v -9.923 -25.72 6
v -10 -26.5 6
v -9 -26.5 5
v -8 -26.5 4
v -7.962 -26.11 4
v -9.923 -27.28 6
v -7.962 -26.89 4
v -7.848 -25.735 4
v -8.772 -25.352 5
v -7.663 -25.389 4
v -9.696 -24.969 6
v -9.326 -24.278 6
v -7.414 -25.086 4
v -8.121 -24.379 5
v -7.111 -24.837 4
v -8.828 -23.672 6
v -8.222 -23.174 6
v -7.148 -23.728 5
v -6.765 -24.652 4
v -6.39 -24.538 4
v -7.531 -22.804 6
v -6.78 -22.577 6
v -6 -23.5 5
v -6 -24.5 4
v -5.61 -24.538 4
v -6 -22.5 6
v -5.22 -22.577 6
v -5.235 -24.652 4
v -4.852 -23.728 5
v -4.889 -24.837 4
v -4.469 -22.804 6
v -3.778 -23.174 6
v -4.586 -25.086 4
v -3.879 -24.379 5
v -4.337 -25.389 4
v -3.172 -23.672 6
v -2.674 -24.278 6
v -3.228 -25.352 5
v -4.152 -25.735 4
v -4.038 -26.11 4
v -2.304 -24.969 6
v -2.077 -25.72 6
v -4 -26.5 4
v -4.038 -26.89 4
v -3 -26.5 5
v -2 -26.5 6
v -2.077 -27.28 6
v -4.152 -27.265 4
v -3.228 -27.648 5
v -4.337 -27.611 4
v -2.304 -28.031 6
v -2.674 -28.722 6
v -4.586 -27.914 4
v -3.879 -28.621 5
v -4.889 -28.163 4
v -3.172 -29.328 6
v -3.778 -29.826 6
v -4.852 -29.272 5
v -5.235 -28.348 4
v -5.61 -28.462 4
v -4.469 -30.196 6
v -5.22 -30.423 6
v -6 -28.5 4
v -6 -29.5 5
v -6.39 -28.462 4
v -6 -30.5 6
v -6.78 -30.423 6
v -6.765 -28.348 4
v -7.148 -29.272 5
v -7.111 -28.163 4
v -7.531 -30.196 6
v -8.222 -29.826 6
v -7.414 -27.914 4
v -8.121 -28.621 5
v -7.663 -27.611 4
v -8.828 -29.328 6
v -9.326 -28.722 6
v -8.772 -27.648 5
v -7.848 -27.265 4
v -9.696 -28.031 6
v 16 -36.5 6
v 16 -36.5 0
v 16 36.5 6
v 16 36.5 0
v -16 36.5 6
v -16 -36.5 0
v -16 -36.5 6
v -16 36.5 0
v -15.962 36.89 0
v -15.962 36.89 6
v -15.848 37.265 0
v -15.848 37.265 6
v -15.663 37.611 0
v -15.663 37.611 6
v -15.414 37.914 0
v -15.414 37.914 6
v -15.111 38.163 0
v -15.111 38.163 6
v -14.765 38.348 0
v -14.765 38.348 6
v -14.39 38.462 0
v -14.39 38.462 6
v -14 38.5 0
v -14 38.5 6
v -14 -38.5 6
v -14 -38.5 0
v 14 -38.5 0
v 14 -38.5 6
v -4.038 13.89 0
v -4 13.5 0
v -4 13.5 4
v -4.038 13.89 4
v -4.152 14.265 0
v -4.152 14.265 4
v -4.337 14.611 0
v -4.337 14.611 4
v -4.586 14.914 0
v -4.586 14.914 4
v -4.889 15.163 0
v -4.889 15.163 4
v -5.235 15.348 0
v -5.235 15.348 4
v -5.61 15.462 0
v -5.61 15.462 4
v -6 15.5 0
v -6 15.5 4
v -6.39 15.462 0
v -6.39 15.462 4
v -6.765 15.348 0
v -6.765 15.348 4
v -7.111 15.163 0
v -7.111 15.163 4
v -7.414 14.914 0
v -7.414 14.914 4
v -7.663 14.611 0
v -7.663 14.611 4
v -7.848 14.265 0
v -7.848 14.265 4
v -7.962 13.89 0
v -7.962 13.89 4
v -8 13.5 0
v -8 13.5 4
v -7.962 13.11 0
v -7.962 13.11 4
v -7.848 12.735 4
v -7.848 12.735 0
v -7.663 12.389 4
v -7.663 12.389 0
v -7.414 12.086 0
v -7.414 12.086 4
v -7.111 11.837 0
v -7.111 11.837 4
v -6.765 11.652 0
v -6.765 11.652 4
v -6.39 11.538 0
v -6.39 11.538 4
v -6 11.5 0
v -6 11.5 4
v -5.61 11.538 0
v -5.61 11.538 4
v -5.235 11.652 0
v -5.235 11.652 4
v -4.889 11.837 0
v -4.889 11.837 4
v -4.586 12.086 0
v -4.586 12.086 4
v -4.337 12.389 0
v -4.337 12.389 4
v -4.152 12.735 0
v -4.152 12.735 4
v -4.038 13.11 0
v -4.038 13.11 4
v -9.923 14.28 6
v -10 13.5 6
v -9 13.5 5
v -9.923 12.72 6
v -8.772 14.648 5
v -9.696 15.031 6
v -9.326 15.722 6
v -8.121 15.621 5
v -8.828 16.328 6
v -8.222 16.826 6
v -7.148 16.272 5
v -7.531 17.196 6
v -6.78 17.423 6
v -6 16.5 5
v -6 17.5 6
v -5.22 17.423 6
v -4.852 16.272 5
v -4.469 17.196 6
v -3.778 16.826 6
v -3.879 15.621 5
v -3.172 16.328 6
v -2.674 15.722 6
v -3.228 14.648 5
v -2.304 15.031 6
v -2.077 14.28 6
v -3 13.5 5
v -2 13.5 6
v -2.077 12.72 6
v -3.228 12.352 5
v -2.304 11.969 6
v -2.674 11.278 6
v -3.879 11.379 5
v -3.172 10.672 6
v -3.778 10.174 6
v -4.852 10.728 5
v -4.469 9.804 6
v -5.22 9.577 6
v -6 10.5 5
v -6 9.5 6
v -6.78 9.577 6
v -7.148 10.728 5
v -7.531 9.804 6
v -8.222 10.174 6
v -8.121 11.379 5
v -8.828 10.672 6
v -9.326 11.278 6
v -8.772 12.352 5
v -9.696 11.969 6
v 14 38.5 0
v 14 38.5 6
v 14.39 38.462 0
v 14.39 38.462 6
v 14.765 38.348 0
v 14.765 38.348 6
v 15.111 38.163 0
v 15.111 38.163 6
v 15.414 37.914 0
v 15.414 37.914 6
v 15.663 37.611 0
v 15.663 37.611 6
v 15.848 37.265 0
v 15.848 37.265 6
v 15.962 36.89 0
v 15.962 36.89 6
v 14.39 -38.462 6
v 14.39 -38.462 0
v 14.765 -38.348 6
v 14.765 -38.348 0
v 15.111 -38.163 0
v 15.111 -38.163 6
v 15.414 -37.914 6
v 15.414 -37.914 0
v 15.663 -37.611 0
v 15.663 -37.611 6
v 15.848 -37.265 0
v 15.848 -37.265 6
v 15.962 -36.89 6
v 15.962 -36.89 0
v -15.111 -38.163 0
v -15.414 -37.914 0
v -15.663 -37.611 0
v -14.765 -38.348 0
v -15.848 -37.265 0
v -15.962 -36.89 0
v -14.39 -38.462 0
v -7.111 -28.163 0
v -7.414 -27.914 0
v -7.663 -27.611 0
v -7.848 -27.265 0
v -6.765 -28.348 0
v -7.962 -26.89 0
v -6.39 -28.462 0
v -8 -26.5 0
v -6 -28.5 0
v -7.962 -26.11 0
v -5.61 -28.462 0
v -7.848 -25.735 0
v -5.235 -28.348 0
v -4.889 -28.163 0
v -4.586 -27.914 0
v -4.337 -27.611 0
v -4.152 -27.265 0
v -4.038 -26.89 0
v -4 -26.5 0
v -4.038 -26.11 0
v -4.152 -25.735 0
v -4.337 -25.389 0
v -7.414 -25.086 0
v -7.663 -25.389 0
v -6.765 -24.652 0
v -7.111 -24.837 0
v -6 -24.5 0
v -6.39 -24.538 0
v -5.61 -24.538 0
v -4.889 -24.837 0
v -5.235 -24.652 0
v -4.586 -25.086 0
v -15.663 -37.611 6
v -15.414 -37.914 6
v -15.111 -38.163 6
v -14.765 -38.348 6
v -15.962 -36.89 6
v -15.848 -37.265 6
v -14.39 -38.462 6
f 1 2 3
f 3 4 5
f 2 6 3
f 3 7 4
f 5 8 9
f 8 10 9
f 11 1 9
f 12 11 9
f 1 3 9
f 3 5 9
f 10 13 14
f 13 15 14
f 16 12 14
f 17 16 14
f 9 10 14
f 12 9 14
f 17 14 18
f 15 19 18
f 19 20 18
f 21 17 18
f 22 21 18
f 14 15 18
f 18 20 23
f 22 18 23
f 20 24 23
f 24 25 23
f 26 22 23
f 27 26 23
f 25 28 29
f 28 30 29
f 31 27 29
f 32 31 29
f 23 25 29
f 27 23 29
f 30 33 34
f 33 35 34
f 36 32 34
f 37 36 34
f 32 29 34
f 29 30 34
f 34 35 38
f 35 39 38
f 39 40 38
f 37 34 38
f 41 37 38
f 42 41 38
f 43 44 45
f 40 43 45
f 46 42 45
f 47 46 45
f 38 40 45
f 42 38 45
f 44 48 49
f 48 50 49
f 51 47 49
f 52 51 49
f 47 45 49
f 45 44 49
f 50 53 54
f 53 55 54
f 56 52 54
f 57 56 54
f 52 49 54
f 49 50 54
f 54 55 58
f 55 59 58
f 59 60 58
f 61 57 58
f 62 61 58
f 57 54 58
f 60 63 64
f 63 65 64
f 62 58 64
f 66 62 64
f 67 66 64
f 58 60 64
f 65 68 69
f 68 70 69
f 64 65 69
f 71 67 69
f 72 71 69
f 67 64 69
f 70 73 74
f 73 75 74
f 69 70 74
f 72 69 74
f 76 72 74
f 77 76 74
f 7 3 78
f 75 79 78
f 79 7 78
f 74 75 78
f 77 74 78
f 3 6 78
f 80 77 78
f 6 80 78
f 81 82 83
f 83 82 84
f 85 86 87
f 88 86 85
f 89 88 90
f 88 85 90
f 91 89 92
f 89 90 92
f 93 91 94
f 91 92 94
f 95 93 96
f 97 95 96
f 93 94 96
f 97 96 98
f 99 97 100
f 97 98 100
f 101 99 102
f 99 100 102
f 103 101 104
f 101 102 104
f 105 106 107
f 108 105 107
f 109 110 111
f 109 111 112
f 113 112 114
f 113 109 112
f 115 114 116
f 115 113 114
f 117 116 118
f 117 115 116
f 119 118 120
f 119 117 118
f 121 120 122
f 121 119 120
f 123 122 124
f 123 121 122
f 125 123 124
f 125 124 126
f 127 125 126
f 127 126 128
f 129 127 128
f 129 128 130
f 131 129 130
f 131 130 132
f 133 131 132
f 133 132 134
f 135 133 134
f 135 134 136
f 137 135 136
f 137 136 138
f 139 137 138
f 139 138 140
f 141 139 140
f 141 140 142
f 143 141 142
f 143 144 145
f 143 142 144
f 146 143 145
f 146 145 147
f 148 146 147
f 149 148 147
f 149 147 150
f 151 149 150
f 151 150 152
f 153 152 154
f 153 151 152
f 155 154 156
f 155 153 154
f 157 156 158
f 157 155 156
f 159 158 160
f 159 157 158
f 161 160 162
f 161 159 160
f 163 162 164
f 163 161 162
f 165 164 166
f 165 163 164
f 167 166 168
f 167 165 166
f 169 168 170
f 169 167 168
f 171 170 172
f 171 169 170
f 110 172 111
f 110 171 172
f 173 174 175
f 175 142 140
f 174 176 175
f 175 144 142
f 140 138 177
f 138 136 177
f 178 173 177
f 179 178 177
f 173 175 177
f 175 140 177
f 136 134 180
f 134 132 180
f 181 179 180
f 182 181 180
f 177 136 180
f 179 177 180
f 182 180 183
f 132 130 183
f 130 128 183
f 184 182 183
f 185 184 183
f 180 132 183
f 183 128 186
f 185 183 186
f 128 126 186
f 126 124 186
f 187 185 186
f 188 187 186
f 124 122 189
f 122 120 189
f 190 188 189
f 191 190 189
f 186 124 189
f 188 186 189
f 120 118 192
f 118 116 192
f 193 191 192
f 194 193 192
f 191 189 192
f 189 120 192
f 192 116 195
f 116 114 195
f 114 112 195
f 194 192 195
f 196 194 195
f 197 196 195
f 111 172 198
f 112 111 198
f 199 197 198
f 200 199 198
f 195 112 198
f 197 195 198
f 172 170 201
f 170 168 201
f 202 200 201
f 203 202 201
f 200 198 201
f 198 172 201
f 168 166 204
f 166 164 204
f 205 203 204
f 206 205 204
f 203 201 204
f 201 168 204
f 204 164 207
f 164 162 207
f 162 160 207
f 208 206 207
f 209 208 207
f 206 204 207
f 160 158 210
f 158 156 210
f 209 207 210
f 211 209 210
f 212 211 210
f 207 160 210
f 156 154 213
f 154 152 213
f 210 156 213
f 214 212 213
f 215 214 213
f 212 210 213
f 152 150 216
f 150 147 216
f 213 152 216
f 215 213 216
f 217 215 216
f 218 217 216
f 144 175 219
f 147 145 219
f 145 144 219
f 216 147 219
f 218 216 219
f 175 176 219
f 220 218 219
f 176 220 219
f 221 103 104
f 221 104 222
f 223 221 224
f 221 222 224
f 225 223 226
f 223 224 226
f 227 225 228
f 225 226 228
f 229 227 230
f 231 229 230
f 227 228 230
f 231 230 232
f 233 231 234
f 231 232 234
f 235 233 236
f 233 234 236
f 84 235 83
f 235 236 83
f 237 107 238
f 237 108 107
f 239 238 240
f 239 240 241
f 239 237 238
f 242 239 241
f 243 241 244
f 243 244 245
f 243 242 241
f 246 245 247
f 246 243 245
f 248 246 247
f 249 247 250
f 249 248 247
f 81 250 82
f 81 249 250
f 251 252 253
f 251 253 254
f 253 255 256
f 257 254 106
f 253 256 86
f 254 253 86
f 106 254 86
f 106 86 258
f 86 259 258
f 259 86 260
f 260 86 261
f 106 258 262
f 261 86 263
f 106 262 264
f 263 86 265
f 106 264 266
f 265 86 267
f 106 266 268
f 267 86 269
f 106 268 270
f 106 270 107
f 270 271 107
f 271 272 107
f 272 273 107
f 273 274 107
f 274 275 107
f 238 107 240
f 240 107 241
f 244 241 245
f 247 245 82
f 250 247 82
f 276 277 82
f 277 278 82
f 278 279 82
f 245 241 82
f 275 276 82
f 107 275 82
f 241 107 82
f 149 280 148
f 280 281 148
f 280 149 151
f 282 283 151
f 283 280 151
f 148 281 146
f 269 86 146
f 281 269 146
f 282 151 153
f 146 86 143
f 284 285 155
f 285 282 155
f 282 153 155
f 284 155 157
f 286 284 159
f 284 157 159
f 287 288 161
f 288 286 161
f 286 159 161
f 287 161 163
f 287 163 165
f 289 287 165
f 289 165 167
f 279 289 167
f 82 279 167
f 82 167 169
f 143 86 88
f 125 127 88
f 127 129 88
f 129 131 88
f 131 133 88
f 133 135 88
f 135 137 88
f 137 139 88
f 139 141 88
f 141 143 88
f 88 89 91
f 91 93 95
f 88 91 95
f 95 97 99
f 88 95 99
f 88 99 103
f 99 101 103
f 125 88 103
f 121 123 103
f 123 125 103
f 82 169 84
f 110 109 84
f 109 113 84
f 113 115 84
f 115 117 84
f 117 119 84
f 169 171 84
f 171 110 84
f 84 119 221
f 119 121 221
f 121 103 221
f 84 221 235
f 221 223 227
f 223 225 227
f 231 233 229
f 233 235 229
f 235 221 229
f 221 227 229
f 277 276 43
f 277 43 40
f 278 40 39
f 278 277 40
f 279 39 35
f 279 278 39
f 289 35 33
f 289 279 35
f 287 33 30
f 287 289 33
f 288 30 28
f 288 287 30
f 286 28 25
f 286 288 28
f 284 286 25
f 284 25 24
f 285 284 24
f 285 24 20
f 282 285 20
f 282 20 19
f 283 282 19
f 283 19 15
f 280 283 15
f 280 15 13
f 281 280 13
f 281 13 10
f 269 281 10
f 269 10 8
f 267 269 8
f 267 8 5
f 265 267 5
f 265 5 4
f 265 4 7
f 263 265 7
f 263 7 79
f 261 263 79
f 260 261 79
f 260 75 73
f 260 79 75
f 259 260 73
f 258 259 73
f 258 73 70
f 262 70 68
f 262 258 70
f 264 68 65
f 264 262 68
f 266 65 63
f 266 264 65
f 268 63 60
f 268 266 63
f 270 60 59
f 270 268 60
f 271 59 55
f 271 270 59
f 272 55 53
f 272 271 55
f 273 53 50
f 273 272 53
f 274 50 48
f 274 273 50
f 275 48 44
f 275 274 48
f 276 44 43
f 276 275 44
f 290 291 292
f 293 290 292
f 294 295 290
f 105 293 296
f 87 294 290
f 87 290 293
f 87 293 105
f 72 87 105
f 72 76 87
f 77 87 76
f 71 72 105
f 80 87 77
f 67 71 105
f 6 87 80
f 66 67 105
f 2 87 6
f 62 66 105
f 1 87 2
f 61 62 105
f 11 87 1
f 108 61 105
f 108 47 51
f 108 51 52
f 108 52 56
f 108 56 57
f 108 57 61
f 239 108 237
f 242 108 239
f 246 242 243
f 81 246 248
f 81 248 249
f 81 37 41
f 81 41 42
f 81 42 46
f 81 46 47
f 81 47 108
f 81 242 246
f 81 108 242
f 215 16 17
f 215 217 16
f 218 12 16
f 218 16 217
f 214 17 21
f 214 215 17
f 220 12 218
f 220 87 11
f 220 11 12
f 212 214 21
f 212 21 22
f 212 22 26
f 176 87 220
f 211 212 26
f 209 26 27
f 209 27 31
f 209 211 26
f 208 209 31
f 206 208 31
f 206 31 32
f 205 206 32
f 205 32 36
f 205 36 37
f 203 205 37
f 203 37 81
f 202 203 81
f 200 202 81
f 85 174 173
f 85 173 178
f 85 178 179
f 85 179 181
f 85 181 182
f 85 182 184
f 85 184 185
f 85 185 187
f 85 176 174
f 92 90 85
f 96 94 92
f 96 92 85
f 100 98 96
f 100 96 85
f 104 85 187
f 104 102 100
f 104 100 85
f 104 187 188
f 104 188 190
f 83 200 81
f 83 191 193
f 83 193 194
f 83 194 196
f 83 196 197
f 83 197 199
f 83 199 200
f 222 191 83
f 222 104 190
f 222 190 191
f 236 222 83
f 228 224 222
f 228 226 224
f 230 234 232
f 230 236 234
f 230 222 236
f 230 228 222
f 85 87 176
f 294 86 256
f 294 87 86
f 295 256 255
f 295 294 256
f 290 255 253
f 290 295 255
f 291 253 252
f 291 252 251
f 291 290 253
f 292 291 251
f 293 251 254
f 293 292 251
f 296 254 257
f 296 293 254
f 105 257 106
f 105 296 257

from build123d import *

# Parameters (mm, degrees)
F0_W           = 32
F0_H           = 77
F0_R           = 2
F1_DEPTH       = 6
F2_R           = 2
F4_D           = 4
F4_DEPTH       = 10
F4_CSINK_D     = 8
F4_CSINK_ANGLE = 90


with BuildPart() as f1:
    # F0 (on Top) → F1 (new body)
    with BuildSketch(Plane.XY):
        Rectangle(F0_W, F0_H)
        with Locations((-6, -26.5)):
            Circle(F0_R, mode=Mode.SUBTRACT)
        with Locations((-6, 13.5)):
            Circle(F0_R, mode=Mode.SUBTRACT)
    extrude(amount=F1_DEPTH)

    # F2
    f2_edges = [f1.edges().sort_by_distance(p)[0] for p in [
        (-16, 38.5, 3),
        (16, 38.5, 3),
        (16, -38.5, 3),
        (-16, -38.5, 3),
    ]]
    fillet(f2_edges, radius=F2_R)

    # F4
    with Locations(Plane.XY.offset(6)):
        with Locations((-6, 13.5), (-6, -26.5)):
            CounterSinkHole(F4_D / 2, F4_CSINK_D / 2, depth=F4_DEPTH, counter_sink_angle=F4_CSINK_ANGLE)


solid = f1.part
